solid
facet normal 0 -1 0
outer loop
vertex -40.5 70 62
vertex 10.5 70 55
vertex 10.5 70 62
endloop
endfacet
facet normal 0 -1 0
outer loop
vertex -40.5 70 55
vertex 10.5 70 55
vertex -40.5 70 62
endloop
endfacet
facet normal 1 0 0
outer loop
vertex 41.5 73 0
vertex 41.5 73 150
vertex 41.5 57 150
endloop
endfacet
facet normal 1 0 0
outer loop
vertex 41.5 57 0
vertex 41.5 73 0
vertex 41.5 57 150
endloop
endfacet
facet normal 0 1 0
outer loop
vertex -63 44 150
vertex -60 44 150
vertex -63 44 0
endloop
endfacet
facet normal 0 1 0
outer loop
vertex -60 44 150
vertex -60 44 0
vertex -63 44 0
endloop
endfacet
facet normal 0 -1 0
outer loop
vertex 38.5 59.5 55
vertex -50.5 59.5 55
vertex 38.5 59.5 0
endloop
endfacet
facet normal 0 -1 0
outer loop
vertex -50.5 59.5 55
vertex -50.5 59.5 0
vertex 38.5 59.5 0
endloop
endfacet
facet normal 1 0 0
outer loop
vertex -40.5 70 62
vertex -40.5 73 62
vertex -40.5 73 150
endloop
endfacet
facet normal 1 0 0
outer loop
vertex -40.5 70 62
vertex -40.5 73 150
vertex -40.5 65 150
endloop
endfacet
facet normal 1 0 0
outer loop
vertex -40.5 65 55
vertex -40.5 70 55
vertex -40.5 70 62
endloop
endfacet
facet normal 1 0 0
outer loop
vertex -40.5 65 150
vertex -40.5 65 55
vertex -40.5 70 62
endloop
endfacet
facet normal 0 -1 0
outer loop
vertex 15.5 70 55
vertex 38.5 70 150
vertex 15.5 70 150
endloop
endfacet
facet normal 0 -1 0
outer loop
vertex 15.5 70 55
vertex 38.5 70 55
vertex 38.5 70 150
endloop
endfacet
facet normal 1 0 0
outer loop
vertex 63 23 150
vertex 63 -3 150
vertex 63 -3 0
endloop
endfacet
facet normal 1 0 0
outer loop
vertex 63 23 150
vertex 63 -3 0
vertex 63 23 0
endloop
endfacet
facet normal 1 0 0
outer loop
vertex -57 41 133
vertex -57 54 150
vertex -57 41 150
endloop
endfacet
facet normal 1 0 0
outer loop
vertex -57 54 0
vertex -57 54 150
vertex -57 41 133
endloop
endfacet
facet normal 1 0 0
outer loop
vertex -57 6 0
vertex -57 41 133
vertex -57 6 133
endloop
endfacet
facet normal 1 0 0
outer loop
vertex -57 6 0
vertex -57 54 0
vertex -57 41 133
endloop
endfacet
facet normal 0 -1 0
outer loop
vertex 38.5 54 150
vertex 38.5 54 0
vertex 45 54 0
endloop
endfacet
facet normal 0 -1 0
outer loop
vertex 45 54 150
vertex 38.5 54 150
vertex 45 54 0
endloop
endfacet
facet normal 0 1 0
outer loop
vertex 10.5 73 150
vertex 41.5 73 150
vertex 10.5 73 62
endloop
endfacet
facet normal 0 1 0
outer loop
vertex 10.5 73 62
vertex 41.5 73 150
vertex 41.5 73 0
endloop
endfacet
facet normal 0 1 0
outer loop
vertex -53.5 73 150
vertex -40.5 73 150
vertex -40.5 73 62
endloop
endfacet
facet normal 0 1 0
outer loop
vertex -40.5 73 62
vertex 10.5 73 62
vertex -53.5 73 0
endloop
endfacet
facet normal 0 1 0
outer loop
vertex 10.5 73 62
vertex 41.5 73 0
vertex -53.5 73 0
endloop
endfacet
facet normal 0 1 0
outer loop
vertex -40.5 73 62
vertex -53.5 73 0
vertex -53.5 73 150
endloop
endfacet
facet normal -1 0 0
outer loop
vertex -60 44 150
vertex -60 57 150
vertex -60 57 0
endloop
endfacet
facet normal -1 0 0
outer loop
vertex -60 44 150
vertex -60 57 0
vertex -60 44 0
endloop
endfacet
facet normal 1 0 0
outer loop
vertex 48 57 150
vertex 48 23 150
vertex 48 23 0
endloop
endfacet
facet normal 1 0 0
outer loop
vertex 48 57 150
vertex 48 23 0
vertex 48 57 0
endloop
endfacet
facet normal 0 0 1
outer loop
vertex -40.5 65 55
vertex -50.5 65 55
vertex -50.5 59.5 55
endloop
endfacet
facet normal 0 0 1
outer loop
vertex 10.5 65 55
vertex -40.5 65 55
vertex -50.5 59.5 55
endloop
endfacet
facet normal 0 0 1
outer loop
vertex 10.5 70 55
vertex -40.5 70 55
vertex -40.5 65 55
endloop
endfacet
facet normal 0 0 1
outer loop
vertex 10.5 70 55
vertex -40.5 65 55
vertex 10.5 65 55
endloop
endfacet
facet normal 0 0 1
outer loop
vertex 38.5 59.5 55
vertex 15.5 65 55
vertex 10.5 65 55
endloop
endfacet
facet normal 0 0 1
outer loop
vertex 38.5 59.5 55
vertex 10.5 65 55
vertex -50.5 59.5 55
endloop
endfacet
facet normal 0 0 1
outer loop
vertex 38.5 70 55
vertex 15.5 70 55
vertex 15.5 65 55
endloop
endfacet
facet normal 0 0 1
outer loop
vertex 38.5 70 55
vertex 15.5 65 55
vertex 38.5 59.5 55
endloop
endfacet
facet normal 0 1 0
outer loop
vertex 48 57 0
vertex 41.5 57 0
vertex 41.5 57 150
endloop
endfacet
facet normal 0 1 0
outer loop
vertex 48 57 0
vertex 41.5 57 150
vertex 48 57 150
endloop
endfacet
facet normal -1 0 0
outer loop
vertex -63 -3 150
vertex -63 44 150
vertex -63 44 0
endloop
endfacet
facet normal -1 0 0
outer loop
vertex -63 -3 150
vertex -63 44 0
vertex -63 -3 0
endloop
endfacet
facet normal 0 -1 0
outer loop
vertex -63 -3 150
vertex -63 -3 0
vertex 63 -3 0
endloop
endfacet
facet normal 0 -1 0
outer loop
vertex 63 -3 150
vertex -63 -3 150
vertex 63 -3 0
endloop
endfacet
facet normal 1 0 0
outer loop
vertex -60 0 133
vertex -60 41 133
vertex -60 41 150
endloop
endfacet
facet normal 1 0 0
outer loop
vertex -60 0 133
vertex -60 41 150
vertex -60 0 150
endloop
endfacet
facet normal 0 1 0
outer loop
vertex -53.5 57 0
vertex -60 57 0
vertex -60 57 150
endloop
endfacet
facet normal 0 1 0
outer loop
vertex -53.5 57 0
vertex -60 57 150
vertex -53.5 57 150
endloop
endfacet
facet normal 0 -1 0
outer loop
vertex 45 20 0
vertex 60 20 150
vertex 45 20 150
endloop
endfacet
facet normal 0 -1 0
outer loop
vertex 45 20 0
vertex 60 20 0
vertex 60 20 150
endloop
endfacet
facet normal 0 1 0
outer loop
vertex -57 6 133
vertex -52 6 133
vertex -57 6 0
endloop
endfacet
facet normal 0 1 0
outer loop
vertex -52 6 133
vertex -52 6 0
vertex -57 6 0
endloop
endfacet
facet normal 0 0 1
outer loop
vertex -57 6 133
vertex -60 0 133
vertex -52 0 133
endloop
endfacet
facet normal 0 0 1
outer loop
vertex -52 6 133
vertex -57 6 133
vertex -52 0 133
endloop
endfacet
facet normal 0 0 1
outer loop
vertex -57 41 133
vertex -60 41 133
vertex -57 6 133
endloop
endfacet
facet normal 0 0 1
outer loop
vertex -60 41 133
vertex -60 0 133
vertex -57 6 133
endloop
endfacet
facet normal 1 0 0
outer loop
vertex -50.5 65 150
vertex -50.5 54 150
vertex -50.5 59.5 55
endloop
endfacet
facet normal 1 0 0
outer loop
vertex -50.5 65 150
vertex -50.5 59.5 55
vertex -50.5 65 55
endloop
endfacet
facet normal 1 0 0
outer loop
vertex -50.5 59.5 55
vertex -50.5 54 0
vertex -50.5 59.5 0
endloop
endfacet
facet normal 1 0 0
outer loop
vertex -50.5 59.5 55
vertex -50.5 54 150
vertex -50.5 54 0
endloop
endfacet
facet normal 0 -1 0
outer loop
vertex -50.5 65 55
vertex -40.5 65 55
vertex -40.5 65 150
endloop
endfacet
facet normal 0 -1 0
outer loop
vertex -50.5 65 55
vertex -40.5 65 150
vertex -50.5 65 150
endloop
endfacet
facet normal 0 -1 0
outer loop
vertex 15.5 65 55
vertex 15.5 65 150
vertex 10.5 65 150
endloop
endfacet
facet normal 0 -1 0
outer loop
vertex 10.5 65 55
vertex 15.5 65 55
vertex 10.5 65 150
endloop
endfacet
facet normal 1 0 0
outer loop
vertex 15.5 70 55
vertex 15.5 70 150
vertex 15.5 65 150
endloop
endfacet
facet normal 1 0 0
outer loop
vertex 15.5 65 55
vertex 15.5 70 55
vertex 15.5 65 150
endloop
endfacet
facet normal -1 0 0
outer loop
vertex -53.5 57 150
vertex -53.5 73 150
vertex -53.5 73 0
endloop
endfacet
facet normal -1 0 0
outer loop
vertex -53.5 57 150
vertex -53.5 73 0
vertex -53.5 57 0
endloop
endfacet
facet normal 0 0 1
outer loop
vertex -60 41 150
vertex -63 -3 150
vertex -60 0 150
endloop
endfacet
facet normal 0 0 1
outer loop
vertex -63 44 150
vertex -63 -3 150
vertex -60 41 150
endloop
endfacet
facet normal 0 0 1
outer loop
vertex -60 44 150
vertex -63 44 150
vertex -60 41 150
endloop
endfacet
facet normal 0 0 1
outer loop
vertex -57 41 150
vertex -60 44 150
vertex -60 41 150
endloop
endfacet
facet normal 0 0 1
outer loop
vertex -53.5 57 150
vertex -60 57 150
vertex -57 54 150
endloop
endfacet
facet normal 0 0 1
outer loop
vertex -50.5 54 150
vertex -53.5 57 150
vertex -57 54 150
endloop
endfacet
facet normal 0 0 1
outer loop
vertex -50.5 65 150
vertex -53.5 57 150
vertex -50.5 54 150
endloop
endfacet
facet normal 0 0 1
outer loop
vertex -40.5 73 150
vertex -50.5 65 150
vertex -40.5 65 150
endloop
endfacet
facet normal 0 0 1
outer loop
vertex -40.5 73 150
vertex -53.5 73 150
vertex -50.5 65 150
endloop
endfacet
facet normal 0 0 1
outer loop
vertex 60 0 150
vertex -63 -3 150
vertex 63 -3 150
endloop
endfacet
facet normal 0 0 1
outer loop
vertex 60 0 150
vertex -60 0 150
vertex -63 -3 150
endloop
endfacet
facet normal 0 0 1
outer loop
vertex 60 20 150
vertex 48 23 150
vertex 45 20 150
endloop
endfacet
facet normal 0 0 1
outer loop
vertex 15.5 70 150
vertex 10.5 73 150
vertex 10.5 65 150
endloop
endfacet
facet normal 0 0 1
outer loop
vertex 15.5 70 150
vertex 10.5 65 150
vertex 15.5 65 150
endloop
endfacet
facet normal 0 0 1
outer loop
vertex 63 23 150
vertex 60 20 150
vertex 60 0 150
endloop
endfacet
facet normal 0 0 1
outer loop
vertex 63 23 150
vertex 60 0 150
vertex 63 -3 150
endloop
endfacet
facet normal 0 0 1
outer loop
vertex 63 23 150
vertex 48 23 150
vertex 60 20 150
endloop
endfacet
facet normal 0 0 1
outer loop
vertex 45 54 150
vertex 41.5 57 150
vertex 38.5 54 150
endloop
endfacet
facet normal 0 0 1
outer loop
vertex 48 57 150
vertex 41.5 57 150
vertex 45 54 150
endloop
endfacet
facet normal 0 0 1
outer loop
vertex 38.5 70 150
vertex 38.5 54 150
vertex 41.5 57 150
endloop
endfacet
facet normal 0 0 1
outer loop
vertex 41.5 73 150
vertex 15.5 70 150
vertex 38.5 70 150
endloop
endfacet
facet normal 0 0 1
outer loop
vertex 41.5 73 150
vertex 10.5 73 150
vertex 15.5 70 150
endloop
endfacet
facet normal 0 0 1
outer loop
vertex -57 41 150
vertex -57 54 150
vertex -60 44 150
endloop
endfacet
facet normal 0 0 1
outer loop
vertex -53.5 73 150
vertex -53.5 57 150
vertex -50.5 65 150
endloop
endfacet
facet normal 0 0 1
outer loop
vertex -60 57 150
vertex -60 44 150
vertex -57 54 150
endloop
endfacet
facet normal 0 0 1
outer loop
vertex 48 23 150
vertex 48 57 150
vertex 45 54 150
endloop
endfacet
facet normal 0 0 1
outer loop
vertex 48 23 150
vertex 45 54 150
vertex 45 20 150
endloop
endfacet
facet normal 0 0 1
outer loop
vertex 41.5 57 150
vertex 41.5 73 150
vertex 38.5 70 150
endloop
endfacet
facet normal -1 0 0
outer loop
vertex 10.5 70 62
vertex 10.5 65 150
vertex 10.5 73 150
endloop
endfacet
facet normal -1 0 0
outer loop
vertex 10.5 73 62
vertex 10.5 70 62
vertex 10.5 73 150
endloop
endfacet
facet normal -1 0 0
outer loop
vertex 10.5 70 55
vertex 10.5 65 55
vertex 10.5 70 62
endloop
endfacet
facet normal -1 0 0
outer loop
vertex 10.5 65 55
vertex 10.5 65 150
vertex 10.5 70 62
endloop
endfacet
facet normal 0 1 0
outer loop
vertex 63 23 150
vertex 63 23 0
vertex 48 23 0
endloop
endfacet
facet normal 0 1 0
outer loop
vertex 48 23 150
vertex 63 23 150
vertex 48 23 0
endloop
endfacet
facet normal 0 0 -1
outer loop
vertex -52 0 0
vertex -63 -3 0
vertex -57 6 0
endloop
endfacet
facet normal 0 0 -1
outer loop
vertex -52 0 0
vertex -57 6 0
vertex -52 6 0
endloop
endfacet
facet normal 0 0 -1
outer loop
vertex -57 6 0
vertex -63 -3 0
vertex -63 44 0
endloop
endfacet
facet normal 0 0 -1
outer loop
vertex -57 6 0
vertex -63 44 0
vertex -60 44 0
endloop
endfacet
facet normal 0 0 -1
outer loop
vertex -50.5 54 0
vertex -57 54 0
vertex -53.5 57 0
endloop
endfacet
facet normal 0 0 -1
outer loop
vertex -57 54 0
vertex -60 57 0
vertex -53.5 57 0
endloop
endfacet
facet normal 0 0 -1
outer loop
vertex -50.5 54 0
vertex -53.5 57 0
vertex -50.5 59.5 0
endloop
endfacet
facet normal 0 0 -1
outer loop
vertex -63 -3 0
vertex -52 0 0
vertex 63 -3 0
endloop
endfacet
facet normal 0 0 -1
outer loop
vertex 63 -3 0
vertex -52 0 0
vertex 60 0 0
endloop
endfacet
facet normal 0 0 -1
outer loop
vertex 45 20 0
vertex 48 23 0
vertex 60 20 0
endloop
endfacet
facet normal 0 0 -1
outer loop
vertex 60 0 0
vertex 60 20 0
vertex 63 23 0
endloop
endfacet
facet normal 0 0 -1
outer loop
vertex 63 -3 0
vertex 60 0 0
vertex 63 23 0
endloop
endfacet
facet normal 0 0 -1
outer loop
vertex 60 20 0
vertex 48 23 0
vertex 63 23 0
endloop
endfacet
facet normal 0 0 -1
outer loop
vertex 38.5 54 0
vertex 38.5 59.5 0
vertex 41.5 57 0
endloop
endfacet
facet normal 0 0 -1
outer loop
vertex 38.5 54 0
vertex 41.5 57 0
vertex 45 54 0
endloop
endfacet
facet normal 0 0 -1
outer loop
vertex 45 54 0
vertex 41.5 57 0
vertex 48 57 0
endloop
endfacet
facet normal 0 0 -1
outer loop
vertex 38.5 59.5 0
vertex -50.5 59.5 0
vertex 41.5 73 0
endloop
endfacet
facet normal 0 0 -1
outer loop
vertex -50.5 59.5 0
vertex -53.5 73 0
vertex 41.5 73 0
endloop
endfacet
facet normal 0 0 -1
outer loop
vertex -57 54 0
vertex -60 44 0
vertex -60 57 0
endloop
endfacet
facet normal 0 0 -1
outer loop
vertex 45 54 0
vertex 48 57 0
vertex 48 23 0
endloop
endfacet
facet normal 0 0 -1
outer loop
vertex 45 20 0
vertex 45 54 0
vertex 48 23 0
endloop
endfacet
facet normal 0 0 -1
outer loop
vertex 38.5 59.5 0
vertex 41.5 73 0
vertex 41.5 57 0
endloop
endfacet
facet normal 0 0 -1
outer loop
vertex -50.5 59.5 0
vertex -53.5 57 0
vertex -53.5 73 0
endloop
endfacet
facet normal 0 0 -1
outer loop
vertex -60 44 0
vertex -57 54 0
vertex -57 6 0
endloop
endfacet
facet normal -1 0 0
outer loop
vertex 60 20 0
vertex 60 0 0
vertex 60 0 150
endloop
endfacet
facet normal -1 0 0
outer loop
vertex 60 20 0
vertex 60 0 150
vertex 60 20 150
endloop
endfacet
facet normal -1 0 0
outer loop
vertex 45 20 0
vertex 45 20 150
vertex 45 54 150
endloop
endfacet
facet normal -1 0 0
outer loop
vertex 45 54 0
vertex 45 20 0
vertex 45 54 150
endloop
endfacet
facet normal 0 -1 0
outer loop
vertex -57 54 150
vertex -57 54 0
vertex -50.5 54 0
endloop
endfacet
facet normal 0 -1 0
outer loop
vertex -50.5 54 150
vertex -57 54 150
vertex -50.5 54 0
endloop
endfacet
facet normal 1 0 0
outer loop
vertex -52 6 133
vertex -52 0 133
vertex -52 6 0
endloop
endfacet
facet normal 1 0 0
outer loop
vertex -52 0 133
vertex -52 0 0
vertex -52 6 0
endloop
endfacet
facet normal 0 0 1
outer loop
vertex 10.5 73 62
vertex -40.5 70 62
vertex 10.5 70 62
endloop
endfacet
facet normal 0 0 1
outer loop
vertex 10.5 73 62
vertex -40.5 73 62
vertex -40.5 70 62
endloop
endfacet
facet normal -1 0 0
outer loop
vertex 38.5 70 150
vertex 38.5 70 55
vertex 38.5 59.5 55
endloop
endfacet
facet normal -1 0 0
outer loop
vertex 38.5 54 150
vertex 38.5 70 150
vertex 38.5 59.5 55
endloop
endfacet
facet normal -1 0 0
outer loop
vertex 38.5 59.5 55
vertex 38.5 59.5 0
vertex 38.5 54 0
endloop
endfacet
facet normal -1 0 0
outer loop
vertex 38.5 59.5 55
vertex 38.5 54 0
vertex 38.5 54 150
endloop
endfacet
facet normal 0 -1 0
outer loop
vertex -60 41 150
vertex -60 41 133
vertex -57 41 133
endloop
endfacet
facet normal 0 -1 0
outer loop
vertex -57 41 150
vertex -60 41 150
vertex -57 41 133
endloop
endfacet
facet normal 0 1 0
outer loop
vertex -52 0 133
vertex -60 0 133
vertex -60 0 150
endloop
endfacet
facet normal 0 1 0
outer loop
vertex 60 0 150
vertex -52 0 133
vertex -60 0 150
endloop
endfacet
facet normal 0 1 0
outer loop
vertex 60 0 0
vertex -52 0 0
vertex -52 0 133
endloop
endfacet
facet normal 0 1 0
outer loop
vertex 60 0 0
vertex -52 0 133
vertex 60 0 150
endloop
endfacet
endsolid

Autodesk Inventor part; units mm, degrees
ref_plane "YZ Plane" through (0, 0, 0) normal (1, 0, 0) x (0, 1, 0)
ref_plane "XZ Plane" through (0, 0, 0) normal (0, 1, 0) x (-1, 0, 0)
ref_plane "XY Plane" through (0, 0, 0) normal (0, 0, 1) x (1, 0, 0)
sketch "Skizze1" plane through (0, 0, 0) normal (0, 0, 1) x (1, 0, 0)
  line L0 (-60, 0) -> (60, 0)
  line L1 (60, 0) -> (60, 20)
  line L2 (60, 20) -> (45, 20)
  line L3 (45, 20) -> (45, 54)
  line L4 (38.5, 70) -> (-50.5, 70)
  line L5 (-60, 41) -> (-60, 0)
  line L6 (-60, 57) -> (-60, 44)
  line L7 (-60, 44) -> (-63, 44)
  line L8 (-63, 44) -> (-63, -3)
  line L9 (-63, -3) -> (63, -3)
  line L10 (63, -3) -> (63, 23)
  line L11 (63, 23) -> (48, 23)
  line L12 (48, 23) -> (48, 57)
  line L13 (41.5, 73) -> (-53.5, 73)
  line L14 (-60, 41) -> (-57, 41)
  line L15 (-57, 54) -> (-50.5, 54)
  line L16 (-50.5, 54) -> (-50.5, 70)
  line L17 (-60, 57) -> (-53.5, 57)
  line L18 (-53.5, 73) -> (-53.5, 57)
  line L19 (-57, 54) -> (-57, 41)
  line L20 (-50.5, 70) -> (-40.5, 70)
  line L21 (-40.5, 70) -> (-40.5, 65)
  line L22 (-40.5, 65) -> (-50.5, 65)
  line L23 (-50.5, 65) -> (-50.5, 70)
  line L24 (10.5, 70) -> (15.5, 70)
  line L25 (15.5, 70) -> (15.5, 65)
  line L26 (15.5, 65) -> (10.5, 65)
  line L27 (10.5, 65) -> (10.5, 70)
  line L28 (41.5, 73) -> (41.5, 57)
  line L29 (41.5, 57) -> (48, 57)
  line L30 (38.5, 70) -> (38.5, 54)
  line L31 (38.5, 54) -> (45, 54)
  line L32 (-60, 0) -> (-52, 0)
  line L33 (-52, 0) -> (-52, 6)
  line L34 (-52, 6) -> (-60, 6)
  line L35 (-60, 6) -> (-60, 0)
  line L36 (24.5, 6) -> (31.5, 6)
  line L37 (31.5, 6) -> (31.5, 0)
  line L38 (31.5, 0) -> (24.5, 0)
  line L39 (24.5, 0) -> (24.5, 6)
  line L40 (-57, 41) -> (-60, 41)
  line L41 (-60, 41) -> (-60, 6)
  line L42 (-60, 6) -> (-57, 6)
  line L43 (-57, 6) -> (-57, 41)
  line L44 (-50.5, 59.5) -> (38.5, 59.5)
  line L45 (-50.5, 59.5) -> (-50.5, 65)
  line L46 (-50.5, 65) -> (-40.5, 65)
  line L47 (-40.5, 65) -> (-40.5, 70)
  line L48 (-40.5, 70) -> (10.5, 70)
  line L49 (10.5, 70) -> (10.5, 65)
  line L50 (10.5, 65) -> (15.5, 65)
  line L51 (15.5, 65) -> (15.5, 70)
  line L52 (15.5, 70) -> (38.5, 70)
  line L53 (38.5, 70) -> (38.5, 59.5)
  point P0 (0, 0)
  point P1 (41.5, 70)
  point P2 (0, 0)
  dimension "d0" = 120
  dimension "d9" = 15
  dimension "d13" = 70
  dimension "d17" = 3
  dimension "d18" = 3
  dimension "d19" = 3
  dimension "d20" = 3
  dimension "d30" = 3
  dimension "d31" = 20
  dimension "d32" = 41
  dimension "d37" = 3
  dimension "d38" = 54
  dimension "d39" = 3
  dimension "d41" = 3
  dimension "d43" = 3
  dimension "d47" = 10
  dimension "d48" = 5
  dimension "d49" = 51
  dimension "d50" = 3
  dimension "d51" = 3
  dimension "d52" = 89
  dimension "d53" = 8
  dimension "d54" = 6
  dimension "d55" = 8
  dimension "d58" = 3
  dimension "d59" = 3
  dimension "d60" = 7
  dimension "d61" = 76.5
  dimension "d68" = 5.5
extrude "Extrusion1" add sketch "Skizze1" along normal blind 150 contours L16 L4 L21 L22 | L25 L26 L27 L4 | L17 L18 L13 L28 L29 L12 L11 L10 L9 L8 L7 L6
extrude "Extrusion3" add sketch "Skizze1" along normal blind 133 contours L5 L34 L33 L0 | L5 L14 L43 L34
sketch "Skizze3" plane through (-53.5, 73, 0) normal (0, 1, 0) x (1, 0, 0)
  line L0 (13, -62) -> (64, -62)
  line L1 (64, -62) -> (64, -150)
  line L2 (64, -150) -> (13, -150)
  line L3 (13, -150) -> (13, -62)
  line L4 (0, 0) -> (0, -150) projected
  line L5 (95, -150) -> (0, -150) projected
  point P0 (60, 0)
  dimension "d25" = 51
  dimension "d26" = 88
  dimension "d45" = 13
extrude "Extrusion2" cut sketch "Skizze3" against normal up to surface (3 mm away)
extrude "Extrusion5" add sketch "Skizze1" along normal blind 55 contours L16 L22 L21 L4 L27 L26 L25 L30 L44
equation "\"d18\" = d20"
equation "\"d19\" = d20"
equation "\"d30\" = d20"
equation "\"d37\" = d20"
equation "\"d39\" = d20"
equation "\"d41\" = d20"
equation "\"d43\" = d20"
equation "\"d50\" = d20"
equation "\"d51\" = d20"
equation "\"d58\" = d20"
properties part number "Gehäuse"
